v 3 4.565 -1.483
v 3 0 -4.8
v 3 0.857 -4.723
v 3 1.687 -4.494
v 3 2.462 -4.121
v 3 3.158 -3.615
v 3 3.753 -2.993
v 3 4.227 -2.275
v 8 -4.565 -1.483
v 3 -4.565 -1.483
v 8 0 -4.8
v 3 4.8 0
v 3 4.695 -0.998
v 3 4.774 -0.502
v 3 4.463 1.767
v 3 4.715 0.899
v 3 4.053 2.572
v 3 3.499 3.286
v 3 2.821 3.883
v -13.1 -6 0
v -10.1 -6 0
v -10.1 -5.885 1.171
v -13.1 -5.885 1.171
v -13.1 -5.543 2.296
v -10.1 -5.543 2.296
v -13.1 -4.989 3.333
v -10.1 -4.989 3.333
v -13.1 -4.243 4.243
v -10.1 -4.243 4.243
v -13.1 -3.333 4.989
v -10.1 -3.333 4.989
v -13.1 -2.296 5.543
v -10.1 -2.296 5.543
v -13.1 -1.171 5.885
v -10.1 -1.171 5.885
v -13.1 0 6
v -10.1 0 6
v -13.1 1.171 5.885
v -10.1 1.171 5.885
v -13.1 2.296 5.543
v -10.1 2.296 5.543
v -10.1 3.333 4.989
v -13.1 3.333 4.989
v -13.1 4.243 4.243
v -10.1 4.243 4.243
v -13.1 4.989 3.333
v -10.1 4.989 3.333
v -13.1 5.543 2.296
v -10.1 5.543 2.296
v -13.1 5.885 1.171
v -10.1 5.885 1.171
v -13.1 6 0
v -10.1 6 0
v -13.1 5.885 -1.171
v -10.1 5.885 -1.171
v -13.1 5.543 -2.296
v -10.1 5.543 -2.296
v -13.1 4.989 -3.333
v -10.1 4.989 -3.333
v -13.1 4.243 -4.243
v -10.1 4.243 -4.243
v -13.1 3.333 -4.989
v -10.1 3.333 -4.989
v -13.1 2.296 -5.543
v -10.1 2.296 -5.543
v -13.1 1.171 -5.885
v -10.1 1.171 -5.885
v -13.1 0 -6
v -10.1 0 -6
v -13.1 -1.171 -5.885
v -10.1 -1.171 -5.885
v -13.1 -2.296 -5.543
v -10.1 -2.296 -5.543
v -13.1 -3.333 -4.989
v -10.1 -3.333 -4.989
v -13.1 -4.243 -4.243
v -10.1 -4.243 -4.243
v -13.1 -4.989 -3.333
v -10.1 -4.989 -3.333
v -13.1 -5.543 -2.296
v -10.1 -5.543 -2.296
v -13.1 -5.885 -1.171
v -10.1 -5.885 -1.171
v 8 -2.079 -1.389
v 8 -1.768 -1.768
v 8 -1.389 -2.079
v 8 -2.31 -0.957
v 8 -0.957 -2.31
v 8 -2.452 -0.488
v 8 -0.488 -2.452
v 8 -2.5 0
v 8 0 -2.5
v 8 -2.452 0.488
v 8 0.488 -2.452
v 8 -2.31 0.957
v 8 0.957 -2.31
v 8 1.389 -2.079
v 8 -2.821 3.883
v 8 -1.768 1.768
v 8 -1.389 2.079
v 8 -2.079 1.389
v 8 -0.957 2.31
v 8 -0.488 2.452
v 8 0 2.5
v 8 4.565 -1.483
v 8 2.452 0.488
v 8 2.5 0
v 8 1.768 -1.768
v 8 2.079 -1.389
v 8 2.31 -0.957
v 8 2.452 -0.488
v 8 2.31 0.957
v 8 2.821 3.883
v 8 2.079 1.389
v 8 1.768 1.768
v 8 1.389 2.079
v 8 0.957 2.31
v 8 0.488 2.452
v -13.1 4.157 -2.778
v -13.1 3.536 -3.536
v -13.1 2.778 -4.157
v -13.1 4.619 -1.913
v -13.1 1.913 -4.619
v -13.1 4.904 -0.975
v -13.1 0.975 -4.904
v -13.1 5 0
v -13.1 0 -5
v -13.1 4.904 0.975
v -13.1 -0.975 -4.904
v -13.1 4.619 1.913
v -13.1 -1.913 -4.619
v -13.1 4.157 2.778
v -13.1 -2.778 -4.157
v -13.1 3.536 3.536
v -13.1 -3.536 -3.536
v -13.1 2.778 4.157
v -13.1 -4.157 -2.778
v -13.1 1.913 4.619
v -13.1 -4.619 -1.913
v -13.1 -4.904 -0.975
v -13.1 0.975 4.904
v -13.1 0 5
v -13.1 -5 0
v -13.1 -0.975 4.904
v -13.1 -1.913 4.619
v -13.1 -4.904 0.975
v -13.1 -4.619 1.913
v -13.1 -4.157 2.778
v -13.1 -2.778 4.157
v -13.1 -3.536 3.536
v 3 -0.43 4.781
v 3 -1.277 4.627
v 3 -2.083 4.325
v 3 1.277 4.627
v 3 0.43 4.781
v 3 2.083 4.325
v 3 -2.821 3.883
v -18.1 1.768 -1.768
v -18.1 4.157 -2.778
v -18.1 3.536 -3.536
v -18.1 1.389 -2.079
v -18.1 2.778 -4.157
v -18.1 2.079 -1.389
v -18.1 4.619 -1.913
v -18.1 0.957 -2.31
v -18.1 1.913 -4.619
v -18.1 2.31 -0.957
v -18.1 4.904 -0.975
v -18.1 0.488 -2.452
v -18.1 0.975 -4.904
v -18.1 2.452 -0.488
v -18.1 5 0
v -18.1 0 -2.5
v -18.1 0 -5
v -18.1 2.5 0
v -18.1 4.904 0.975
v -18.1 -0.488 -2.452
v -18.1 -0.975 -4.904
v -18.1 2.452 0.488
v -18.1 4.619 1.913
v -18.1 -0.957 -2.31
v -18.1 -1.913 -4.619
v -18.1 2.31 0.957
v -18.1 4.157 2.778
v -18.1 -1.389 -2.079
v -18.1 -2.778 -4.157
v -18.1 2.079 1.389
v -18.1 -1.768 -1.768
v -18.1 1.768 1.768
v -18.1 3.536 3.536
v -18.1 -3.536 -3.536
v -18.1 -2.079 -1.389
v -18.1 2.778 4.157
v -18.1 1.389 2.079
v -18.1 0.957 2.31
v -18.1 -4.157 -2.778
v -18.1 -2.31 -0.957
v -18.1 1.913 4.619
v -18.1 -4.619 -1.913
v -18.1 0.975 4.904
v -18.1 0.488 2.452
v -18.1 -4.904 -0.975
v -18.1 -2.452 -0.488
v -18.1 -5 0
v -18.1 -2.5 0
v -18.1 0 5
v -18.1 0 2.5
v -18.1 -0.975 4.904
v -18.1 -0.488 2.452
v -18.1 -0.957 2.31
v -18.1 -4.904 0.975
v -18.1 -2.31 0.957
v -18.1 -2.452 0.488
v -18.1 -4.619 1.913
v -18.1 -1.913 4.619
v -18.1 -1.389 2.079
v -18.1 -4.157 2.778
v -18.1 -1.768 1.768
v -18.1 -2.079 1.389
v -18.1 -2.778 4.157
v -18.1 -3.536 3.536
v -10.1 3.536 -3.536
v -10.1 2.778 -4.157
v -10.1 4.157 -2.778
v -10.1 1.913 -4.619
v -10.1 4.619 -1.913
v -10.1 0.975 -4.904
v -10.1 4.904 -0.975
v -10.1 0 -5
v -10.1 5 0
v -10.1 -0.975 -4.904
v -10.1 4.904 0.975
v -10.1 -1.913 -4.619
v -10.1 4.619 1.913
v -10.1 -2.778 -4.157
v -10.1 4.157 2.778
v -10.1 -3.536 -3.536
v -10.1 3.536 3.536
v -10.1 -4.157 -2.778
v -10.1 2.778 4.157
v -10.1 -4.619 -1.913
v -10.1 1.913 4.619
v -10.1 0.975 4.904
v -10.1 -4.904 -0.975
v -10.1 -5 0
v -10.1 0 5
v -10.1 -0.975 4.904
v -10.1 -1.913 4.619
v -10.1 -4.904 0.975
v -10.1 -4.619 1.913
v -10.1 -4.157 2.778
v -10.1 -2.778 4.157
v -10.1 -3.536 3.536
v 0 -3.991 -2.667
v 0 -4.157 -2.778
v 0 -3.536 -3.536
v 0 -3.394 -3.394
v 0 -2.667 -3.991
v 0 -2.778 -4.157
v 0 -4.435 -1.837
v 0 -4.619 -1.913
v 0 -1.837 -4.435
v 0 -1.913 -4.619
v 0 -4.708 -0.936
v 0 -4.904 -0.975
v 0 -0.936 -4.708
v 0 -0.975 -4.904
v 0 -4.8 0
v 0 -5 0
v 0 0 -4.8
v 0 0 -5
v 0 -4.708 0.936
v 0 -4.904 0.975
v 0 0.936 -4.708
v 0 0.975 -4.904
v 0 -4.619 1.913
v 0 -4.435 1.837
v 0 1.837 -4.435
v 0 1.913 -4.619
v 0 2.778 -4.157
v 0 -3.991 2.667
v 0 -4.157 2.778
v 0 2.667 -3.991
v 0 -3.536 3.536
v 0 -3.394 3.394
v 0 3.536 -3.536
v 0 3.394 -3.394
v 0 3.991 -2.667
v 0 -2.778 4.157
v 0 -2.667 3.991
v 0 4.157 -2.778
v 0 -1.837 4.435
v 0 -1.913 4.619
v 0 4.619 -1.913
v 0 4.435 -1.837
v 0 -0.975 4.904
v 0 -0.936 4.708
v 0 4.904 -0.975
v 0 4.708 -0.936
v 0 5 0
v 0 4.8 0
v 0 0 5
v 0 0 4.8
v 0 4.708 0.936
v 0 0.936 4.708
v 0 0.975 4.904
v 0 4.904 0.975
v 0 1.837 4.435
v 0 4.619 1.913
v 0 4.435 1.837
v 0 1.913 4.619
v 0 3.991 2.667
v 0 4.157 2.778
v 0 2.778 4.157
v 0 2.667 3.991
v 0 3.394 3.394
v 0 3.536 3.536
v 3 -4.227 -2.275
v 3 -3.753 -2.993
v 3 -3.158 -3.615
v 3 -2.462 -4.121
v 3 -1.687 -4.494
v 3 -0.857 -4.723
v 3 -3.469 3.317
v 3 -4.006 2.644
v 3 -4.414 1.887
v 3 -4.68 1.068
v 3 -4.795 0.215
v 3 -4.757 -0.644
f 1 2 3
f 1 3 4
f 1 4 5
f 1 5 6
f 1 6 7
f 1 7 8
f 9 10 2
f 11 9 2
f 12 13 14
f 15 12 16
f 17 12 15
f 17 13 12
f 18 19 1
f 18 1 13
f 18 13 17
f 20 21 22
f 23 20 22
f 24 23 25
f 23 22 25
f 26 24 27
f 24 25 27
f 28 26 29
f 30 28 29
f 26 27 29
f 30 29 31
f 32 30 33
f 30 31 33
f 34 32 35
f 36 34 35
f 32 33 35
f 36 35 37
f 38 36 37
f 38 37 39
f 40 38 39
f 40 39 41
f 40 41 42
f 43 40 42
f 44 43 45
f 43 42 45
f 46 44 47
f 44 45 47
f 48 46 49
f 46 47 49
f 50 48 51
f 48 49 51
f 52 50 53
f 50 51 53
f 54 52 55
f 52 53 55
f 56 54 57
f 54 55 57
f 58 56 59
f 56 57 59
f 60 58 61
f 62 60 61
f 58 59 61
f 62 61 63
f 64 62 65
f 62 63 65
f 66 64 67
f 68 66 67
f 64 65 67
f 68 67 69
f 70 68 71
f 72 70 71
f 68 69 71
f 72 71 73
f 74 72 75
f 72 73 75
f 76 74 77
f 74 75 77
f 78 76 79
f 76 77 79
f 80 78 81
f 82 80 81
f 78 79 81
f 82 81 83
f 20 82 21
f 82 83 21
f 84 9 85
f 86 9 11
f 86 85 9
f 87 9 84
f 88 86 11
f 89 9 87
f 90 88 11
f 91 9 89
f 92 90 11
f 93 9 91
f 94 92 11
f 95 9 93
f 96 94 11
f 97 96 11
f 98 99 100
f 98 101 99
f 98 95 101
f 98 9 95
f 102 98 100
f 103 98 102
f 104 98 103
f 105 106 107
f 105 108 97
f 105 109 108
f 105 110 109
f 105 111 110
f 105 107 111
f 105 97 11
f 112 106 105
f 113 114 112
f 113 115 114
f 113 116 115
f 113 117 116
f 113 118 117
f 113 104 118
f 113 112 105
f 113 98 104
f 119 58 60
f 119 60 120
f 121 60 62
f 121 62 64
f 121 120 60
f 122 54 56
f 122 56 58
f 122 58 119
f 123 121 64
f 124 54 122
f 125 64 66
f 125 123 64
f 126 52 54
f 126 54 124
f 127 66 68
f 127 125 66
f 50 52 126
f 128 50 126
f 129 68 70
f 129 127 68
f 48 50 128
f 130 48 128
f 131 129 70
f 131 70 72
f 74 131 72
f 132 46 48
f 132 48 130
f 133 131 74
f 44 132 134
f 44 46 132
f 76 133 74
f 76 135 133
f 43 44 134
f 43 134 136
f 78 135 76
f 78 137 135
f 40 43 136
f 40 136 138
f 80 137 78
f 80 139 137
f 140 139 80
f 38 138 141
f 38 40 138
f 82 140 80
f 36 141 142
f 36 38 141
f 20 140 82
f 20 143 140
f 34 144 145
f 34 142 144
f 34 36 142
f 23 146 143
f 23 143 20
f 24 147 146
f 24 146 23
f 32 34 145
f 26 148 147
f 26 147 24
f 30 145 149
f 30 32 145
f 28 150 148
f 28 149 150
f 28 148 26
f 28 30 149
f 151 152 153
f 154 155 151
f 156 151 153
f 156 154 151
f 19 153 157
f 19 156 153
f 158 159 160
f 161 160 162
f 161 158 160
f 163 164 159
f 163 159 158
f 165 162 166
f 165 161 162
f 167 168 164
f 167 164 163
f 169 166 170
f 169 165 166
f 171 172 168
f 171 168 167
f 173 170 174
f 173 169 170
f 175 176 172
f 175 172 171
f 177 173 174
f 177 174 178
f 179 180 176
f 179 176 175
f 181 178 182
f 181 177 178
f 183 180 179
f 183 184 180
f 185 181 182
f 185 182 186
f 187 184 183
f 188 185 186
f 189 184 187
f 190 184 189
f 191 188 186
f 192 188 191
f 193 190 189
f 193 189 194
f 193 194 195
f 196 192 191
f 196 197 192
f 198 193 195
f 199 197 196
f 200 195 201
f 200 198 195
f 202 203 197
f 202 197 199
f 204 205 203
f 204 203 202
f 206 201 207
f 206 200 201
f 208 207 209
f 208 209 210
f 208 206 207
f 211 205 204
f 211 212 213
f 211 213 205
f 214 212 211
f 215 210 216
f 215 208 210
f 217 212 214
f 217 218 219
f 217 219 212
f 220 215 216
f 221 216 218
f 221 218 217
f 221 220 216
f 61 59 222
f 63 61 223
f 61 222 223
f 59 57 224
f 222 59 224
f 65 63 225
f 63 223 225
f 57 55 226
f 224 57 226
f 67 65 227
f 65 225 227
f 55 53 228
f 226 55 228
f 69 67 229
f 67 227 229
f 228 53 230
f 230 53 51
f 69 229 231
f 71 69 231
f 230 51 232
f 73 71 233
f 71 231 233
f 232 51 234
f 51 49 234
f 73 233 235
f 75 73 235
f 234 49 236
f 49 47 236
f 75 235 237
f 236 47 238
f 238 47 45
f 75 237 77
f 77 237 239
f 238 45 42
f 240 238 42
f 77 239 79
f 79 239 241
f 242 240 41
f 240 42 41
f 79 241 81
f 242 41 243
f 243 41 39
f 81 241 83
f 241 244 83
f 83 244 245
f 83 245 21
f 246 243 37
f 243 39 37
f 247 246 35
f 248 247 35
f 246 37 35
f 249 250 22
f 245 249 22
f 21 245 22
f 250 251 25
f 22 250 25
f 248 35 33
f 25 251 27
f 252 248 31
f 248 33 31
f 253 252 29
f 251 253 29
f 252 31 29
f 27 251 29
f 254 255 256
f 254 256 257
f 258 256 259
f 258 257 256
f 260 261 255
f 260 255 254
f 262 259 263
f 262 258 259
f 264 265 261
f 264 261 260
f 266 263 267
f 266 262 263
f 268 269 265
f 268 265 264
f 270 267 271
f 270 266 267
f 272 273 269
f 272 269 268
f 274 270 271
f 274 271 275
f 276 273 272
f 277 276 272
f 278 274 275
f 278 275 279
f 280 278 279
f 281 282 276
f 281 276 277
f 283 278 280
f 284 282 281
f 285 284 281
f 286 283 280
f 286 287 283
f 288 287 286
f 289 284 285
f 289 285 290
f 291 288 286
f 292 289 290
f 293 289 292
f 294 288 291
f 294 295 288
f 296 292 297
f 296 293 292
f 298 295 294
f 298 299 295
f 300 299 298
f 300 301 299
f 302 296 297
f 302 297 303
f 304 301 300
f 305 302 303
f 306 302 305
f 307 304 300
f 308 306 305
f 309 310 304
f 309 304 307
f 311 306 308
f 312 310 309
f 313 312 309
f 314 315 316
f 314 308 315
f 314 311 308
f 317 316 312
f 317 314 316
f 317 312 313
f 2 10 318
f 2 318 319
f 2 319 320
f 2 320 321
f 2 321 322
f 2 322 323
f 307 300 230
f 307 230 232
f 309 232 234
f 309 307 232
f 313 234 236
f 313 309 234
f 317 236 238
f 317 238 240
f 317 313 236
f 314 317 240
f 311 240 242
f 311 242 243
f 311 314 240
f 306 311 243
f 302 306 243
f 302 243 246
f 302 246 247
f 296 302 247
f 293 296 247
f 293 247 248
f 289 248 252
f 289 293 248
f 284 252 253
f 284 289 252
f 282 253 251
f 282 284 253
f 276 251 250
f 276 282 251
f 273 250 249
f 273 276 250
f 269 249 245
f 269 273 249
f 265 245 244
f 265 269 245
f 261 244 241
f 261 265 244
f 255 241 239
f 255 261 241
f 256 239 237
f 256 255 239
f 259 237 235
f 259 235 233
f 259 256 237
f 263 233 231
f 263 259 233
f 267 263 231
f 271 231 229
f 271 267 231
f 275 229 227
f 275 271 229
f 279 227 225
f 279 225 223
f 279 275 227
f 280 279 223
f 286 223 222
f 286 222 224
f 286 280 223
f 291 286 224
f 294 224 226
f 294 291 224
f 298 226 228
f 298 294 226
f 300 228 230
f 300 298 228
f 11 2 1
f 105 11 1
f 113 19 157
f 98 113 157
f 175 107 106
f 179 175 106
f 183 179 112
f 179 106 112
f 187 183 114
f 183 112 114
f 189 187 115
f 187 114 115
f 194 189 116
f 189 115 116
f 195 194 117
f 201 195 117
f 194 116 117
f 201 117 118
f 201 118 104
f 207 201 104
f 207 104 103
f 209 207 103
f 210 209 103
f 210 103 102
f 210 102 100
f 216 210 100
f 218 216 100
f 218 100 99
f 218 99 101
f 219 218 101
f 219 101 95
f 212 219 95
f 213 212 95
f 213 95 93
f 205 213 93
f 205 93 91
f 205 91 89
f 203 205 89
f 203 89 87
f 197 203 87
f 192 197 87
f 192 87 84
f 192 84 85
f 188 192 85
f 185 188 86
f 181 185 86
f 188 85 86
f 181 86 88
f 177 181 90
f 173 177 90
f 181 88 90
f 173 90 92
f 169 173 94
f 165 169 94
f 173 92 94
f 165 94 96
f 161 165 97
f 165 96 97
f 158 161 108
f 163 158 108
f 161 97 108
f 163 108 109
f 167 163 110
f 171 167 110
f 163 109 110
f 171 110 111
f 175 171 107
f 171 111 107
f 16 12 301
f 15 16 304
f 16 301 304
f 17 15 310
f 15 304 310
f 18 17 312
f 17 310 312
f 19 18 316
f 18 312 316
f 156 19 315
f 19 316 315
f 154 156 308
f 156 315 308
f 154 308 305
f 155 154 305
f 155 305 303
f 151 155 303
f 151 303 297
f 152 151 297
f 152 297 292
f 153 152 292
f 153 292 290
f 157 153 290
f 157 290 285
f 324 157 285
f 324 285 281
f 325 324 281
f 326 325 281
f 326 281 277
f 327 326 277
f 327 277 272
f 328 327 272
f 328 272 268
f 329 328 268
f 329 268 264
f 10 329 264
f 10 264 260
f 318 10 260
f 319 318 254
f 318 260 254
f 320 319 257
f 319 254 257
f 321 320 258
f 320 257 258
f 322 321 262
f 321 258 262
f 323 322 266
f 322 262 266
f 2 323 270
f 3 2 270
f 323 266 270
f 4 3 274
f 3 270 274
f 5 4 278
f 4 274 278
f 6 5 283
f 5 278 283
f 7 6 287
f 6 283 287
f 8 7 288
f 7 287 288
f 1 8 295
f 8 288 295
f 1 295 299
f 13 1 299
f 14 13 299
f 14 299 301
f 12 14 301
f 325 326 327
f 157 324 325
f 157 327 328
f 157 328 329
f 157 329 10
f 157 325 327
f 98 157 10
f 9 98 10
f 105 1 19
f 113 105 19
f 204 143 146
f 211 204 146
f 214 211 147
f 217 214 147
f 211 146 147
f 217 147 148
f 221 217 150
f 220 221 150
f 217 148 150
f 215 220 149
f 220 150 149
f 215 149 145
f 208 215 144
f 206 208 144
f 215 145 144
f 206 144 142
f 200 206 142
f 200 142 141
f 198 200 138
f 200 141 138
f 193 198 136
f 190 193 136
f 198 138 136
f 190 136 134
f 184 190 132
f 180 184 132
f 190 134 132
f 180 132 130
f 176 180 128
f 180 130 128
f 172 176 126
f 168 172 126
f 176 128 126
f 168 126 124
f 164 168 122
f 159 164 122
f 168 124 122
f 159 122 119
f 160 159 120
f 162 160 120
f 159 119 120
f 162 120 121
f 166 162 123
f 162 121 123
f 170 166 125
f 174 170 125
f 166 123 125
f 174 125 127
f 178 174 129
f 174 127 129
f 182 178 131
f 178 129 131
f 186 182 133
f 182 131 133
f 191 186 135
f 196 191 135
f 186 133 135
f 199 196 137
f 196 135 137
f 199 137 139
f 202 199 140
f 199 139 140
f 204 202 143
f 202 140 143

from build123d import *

# Parameters (mm, degrees)
F0_R      = 5
F1_DEPTH  = 10.1
F2_R      = 4.8
F3_DEPTH  = 3
F5_DEPTH  = 5
F6_R      = 6
F7_DEPTH  = 3
F8_R      = 5
F9_DEPTH  = 5
F10_R     = 2.5
F11_DEPTH = 80


with BuildPart() as f1:
    # F0 (on Right) → F1 (new body)
    with BuildSketch(Plane.YZ):
        Circle(F0_R)
    extrude(amount=-F1_DEPTH)

    # F2 (on face) → F3 (join)
    with BuildSketch(Plane.YZ):
        Circle(F2_R)
    extrude(amount=F3_DEPTH)

    # F4 (on face) → F5 (join)
    with BuildSketch(Plane.YZ.offset(3)):
        Polygon((-4.565071, -1.483282), (0, -4.8), (4.565071, -1.483282), (2.821369, 3.883282), (-2.821369, 3.883282), align=None)
    extrude(amount=F5_DEPTH)

    # F6 (on face) → F7 (join)
    with BuildSketch(Plane(origin=(-10.1, 0, 0), x_dir=(0, -1, 0), z_dir=(-1, 0, 0))):
        Circle(F6_R)
    extrude(amount=F7_DEPTH)

    # F8 (on face) → F9 (join)
    with BuildSketch(Plane(origin=(-13.1, 0, 0), x_dir=(0, -1, 0), z_dir=(-1, 0, 0))):
        Circle(F8_R)
    extrude(amount=F9_DEPTH)

    # F10 (on face) → F11 (cut)
    with BuildSketch(Plane.YZ.offset(8)):
        Circle(F10_R)
    extrude(amount=-F11_DEPTH, mode=Mode.SUBTRACT)


solid = f1.part
